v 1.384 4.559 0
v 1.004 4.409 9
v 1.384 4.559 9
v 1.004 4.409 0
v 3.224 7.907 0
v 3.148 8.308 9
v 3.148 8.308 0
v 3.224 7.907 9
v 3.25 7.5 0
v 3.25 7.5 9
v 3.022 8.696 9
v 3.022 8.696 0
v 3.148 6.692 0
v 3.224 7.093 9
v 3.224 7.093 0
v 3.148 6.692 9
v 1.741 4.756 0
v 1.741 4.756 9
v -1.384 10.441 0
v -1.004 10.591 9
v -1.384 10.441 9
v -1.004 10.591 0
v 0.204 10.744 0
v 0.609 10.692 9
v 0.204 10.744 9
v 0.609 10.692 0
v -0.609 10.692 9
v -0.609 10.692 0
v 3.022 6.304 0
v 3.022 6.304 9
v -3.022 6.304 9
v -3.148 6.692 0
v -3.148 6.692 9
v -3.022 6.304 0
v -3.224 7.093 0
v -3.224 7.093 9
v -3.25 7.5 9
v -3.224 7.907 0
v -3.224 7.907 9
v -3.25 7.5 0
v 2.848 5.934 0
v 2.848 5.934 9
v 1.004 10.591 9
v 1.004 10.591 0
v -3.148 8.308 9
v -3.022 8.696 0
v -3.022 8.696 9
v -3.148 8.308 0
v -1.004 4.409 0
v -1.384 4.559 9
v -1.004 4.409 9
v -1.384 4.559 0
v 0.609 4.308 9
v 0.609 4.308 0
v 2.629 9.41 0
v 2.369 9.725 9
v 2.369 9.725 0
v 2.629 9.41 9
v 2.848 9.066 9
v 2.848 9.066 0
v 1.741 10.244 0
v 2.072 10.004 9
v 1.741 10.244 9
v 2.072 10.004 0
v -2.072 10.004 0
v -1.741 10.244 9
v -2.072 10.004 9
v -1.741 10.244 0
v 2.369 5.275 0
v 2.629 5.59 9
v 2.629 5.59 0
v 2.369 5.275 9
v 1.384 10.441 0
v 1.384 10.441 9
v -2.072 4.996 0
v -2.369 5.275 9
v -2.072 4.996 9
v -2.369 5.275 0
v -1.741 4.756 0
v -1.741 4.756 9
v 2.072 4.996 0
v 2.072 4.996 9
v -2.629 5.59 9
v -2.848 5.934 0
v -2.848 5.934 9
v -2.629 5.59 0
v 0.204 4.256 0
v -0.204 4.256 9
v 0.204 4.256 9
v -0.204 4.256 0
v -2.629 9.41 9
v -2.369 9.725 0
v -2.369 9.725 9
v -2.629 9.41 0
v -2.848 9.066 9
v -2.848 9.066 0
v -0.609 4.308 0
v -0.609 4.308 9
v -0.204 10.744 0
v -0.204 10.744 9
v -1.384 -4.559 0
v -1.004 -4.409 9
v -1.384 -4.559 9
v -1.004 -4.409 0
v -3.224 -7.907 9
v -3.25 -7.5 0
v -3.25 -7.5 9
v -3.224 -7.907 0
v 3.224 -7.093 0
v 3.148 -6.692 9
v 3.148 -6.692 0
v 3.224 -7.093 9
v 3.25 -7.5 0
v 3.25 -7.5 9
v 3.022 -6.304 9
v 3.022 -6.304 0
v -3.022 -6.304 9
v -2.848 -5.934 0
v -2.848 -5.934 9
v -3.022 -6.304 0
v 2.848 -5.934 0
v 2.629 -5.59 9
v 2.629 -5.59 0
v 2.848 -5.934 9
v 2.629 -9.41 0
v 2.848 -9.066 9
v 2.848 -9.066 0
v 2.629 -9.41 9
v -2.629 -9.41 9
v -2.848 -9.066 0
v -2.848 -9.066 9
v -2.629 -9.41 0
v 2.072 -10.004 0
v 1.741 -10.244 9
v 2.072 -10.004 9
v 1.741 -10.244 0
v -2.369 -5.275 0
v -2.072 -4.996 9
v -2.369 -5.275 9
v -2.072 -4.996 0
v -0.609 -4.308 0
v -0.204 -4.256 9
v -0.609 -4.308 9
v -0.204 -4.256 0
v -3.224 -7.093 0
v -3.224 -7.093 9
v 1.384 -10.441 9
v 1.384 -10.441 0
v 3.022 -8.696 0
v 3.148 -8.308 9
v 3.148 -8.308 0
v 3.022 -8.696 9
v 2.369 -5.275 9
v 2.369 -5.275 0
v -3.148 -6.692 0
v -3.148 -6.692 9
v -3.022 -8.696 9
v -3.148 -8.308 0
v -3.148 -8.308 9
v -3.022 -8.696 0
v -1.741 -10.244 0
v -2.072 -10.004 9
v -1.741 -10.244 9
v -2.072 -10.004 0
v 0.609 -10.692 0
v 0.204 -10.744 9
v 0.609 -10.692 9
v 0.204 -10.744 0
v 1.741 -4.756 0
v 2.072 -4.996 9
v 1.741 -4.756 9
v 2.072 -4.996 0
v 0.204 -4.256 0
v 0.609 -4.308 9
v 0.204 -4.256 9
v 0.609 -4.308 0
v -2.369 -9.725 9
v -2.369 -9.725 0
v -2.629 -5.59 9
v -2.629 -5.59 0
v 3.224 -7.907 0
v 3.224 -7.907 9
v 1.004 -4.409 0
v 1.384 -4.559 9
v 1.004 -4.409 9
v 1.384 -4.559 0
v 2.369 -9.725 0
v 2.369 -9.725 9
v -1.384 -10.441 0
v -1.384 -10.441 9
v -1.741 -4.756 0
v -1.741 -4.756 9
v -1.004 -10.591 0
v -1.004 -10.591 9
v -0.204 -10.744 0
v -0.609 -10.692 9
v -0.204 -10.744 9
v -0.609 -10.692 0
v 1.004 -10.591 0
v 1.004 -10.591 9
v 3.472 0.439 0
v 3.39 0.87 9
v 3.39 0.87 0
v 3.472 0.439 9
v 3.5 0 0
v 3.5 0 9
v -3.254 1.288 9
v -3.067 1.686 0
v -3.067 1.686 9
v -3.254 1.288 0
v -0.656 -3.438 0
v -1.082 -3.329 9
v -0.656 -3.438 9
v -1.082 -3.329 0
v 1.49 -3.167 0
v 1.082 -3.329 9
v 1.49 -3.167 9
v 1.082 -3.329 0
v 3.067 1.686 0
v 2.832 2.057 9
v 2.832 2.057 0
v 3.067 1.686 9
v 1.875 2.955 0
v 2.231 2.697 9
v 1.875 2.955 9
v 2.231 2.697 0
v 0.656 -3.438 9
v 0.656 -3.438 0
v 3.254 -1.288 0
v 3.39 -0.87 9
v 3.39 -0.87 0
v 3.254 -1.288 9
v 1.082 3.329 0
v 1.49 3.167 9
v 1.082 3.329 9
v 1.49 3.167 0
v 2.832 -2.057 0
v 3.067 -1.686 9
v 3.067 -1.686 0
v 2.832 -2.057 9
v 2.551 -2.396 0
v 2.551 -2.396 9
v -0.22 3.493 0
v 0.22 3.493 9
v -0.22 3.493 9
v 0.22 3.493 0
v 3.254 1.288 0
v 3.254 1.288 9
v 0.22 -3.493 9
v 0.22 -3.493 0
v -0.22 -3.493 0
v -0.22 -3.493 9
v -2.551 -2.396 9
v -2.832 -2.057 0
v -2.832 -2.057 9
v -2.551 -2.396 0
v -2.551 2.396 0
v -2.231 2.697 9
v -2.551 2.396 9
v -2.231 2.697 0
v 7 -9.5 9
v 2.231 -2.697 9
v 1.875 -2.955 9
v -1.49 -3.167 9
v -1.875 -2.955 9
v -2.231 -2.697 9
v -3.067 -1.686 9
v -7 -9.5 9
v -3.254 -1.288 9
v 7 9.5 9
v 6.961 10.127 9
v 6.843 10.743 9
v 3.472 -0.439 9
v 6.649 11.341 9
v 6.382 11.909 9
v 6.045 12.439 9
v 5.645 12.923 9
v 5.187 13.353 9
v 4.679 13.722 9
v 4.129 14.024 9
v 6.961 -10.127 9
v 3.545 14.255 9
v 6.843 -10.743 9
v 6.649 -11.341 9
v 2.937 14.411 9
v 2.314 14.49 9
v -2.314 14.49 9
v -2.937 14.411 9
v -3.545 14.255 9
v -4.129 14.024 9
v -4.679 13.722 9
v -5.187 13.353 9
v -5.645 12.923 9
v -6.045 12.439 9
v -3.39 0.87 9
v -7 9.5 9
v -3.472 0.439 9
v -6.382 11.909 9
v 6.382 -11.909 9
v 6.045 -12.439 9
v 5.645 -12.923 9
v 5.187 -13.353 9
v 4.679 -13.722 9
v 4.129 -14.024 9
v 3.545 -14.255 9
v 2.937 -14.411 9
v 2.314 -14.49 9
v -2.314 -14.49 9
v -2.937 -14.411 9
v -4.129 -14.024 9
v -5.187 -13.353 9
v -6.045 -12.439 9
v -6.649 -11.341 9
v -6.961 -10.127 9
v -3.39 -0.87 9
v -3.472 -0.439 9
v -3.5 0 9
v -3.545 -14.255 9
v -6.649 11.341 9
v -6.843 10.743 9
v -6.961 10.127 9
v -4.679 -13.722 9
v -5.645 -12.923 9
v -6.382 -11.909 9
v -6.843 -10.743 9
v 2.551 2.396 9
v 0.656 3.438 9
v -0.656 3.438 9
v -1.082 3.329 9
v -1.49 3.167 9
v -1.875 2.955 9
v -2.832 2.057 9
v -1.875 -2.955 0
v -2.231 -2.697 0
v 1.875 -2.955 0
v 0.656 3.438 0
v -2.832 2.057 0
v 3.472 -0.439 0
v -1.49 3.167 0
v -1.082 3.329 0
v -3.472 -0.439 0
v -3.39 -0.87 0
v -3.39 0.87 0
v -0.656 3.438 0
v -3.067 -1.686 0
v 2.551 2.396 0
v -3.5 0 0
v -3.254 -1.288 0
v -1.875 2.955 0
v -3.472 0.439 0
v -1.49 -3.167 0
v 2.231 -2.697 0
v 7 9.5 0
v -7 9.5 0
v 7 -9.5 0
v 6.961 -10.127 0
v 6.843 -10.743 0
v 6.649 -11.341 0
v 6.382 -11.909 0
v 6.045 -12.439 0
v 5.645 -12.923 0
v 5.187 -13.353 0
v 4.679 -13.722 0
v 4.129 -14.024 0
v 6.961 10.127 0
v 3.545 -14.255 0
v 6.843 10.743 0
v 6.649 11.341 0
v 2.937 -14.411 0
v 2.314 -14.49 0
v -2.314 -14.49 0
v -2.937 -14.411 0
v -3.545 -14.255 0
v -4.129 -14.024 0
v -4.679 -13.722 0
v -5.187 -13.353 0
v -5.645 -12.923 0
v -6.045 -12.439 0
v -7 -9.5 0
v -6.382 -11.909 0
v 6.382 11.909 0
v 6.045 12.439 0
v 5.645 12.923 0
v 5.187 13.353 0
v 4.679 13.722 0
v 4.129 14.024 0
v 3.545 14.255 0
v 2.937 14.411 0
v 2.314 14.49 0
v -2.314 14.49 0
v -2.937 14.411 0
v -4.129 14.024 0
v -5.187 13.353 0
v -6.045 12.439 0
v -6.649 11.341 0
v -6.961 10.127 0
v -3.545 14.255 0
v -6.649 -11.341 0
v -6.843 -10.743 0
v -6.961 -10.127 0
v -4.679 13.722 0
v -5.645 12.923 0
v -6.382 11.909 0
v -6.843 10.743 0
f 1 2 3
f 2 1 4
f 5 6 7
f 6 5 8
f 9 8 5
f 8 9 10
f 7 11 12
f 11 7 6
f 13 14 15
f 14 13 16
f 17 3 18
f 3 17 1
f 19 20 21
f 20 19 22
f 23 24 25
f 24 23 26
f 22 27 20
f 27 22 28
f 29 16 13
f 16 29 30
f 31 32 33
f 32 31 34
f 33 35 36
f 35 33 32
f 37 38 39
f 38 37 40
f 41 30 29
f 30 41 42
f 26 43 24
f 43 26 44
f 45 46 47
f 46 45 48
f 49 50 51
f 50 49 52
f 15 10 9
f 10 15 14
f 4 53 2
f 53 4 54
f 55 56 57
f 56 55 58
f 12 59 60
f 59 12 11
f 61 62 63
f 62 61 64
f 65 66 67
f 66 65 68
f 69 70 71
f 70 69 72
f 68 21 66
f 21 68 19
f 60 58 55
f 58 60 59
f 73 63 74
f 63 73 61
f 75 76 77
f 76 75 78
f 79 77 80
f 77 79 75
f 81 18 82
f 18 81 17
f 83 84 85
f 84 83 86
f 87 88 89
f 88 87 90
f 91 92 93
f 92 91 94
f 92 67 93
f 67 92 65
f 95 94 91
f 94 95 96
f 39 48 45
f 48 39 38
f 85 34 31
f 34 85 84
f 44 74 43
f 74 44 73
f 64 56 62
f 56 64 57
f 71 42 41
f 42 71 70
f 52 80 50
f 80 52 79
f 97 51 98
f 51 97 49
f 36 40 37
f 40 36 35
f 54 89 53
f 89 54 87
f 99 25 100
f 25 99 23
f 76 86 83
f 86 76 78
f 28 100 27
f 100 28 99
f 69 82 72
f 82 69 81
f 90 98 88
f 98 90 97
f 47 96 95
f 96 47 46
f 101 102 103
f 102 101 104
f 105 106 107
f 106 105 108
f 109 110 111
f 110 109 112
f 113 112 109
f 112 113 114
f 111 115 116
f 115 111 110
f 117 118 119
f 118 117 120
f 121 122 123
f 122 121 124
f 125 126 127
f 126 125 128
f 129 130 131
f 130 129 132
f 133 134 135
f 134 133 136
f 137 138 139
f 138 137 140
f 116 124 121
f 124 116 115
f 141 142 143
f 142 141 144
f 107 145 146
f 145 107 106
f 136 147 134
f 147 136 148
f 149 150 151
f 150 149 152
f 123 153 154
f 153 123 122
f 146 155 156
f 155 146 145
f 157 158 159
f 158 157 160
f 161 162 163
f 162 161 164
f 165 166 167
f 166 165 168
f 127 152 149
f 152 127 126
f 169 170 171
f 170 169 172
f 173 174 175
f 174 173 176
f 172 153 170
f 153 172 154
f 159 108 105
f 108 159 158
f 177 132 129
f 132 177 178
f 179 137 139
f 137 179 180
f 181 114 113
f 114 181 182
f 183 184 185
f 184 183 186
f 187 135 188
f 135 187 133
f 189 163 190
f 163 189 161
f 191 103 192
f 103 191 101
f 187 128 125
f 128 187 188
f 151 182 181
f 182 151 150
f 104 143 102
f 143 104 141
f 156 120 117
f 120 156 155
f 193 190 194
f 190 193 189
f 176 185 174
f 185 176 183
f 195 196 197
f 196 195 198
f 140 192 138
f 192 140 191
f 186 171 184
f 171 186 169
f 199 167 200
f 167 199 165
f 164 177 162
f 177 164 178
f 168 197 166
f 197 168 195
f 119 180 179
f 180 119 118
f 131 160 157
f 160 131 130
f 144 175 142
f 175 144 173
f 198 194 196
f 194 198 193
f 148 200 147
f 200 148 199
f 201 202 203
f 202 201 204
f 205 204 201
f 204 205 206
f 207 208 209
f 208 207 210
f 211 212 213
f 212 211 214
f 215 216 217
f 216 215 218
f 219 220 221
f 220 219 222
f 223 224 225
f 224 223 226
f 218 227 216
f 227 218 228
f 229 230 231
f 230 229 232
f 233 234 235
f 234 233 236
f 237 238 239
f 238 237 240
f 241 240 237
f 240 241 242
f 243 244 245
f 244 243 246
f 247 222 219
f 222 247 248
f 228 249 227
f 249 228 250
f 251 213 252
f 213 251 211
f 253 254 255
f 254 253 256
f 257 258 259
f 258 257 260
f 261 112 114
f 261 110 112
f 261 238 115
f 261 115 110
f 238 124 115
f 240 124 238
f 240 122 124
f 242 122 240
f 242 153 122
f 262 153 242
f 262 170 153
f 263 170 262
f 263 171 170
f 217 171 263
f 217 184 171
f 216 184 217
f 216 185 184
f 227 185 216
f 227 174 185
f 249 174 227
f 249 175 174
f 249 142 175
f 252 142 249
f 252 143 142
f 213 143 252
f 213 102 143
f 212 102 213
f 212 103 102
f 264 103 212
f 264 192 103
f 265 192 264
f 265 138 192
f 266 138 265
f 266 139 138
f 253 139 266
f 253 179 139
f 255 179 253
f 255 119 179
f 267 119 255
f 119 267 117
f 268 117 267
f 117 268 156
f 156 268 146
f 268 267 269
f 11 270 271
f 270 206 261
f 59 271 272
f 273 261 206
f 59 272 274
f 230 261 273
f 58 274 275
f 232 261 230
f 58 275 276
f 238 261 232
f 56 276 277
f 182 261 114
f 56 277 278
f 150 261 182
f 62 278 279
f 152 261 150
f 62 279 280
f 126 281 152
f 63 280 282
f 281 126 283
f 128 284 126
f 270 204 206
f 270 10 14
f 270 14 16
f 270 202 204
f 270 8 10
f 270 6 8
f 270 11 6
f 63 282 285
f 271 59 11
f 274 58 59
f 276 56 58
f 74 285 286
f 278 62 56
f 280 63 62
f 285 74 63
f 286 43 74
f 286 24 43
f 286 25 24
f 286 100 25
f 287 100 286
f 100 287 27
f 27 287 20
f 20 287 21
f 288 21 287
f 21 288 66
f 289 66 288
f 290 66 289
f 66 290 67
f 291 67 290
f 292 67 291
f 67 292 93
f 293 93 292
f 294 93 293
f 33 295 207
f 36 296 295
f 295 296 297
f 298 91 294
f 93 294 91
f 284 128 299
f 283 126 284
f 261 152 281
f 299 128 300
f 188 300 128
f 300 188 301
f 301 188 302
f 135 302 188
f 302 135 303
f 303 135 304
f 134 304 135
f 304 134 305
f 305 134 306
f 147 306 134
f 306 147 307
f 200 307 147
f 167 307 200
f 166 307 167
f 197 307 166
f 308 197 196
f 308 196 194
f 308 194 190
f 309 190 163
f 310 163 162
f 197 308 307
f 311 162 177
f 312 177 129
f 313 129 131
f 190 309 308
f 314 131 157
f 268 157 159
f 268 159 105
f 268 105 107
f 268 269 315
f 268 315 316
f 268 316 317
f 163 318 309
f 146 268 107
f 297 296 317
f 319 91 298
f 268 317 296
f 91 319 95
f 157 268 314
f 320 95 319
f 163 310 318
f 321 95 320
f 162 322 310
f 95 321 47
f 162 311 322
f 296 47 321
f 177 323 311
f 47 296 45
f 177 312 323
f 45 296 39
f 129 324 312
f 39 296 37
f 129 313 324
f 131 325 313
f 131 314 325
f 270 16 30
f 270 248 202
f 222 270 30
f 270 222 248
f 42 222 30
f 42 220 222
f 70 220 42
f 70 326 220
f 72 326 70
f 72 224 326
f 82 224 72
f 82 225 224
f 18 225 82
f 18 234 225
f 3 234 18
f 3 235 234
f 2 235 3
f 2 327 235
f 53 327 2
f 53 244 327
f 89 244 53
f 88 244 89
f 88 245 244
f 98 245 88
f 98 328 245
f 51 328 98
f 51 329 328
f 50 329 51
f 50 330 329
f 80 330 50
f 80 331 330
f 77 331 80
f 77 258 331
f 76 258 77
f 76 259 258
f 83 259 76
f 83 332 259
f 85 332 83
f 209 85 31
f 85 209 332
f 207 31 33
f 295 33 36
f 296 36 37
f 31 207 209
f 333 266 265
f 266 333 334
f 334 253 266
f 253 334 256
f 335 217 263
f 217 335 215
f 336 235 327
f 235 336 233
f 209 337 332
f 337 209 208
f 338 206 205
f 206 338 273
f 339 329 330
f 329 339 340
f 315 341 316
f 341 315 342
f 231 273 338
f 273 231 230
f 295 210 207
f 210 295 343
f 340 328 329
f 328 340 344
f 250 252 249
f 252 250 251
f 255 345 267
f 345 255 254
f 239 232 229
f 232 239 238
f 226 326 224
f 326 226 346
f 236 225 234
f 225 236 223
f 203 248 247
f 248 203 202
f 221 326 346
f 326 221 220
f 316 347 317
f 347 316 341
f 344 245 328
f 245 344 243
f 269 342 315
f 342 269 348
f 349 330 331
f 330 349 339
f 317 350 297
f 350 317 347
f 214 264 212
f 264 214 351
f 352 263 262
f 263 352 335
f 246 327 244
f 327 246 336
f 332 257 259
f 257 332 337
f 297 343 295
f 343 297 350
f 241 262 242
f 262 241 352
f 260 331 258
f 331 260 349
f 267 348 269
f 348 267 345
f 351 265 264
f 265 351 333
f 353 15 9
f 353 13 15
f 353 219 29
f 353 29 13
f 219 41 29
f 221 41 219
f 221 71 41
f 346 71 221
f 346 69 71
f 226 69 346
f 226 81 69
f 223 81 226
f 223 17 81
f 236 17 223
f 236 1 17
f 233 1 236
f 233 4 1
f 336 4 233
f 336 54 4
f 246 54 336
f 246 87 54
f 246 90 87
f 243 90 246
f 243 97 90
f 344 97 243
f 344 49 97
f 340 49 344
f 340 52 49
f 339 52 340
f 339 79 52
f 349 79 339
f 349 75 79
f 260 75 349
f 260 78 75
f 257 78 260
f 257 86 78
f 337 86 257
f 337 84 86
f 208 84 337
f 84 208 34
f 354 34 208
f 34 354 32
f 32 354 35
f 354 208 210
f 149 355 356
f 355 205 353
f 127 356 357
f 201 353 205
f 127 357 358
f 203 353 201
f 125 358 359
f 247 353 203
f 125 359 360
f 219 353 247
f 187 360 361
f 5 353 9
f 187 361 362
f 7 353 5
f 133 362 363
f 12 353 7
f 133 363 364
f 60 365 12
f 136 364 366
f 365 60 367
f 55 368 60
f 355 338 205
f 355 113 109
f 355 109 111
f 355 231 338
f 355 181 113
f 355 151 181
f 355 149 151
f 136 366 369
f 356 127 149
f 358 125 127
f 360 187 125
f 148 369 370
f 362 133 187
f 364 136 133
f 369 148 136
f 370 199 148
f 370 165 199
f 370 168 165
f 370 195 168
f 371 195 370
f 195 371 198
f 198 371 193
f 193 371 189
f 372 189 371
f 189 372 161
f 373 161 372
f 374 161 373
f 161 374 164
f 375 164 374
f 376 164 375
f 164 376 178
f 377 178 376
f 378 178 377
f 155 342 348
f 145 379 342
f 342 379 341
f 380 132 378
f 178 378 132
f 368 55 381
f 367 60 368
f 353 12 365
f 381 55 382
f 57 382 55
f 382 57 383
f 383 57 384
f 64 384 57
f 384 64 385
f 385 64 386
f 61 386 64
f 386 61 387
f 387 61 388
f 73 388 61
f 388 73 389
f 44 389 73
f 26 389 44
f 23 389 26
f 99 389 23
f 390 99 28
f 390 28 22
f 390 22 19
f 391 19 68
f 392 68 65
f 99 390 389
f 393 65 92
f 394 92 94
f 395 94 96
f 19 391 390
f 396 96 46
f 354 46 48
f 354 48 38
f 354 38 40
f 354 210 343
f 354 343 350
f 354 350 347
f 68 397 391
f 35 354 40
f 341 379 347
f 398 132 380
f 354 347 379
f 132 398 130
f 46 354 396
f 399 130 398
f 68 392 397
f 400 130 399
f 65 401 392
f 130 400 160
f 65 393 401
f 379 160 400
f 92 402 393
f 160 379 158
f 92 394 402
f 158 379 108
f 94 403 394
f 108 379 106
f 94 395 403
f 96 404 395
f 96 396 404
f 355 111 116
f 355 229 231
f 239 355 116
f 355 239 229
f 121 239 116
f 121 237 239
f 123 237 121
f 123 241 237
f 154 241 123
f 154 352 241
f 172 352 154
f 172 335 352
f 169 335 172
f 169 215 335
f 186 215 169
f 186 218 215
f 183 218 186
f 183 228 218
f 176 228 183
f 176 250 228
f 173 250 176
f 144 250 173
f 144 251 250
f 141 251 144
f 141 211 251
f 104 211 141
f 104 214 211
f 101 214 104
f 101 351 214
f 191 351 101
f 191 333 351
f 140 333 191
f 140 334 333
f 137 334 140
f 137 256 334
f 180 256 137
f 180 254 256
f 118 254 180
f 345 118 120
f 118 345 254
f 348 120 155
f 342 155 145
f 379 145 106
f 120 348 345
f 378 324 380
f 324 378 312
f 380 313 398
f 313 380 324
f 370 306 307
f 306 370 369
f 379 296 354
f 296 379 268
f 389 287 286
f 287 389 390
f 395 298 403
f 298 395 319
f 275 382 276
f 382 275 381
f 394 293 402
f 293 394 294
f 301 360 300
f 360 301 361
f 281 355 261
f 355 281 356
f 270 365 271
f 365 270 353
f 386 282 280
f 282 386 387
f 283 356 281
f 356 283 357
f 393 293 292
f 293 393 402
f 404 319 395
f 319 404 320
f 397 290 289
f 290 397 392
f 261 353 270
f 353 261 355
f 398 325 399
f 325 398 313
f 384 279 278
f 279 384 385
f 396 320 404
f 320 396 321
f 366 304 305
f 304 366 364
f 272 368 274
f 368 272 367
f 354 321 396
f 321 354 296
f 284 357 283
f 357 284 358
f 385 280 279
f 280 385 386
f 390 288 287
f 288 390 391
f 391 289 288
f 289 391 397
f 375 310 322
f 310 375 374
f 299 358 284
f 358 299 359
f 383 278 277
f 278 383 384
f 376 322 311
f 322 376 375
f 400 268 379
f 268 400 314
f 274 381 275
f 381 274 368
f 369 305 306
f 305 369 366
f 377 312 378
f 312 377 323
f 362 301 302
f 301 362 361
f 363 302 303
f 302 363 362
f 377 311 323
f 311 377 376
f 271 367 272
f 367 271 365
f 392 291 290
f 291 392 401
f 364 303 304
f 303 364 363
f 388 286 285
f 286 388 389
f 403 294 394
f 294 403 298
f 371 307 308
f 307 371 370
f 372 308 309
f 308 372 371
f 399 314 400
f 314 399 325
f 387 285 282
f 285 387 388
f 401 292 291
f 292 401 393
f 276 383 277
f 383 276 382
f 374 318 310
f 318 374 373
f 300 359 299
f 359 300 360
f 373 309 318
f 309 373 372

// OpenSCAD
$fn = 50;


difference() {
	union() {
		hull() {
			translate(v = [-2.0000000000, 9.5000000000, 0]) {
				cylinder(h = 9, r = 5);
			}
			translate(v = [2.0000000000, 9.5000000000, 0]) {
				cylinder(h = 9, r = 5);
			}
			translate(v = [-2.0000000000, -9.5000000000, 0]) {
				cylinder(h = 9, r = 5);
			}
			translate(v = [2.0000000000, -9.5000000000, 0]) {
				cylinder(h = 9, r = 5);
			}
		}
	}
	union() {
		#translate(v = [0.0000000000, 7.5000000000, 0]) {
			cylinder(h = 9, r = 3.2500000000);
		}
		#translate(v = [0.0000000000, -7.5000000000, 0]) {
			cylinder(h = 9, r = 3.2500000000);
		}
		#translate(v = [0.0000000000, -7.5000000000, -100.0000000000]) {
			cylinder(h = 200, r = 3.2500000000);
		}
		#translate(v = [0.0000000000, -7.5000000000, -100.0000000000]) {
			cylinder(h = 200, r = 3.2500000000);
		}
		#translate(v = [0.0000000000, 7.5000000000, -100.0000000000]) {
			cylinder(h = 200, r = 3.2500000000);
		}
		#translate(v = [0.0000000000, 7.5000000000, -100.0000000000]) {
			cylinder(h = 200, r = 3.2500000000);
		}
		#translate(v = [0.0000000000, 7.5000000000, 0]) {
			cylinder(h = 9, r = 1.8000000000);
		}
		#translate(v = [0.0000000000, -7.5000000000, 0]) {
			cylinder(h = 9, r = 1.8000000000);
		}
		#translate(v = [0.0000000000, 7.5000000000, 0]) {
			cylinder(h = 9, r = 1.8000000000);
		}
		#translate(v = [0.0000000000, -7.5000000000, 0]) {
			cylinder(h = 9, r = 1.8000000000);
		}
		#translate(v = [0.0000000000, 7.5000000000, 0]) {
			cylinder(h = 9, r = 1.8000000000);
		}
		#translate(v = [0.0000000000, -7.5000000000, 0]) {
			cylinder(h = 9, r = 1.8000000000);
		}
		#cylinder(h = 9, r = 3.5000000000);
	}
}
